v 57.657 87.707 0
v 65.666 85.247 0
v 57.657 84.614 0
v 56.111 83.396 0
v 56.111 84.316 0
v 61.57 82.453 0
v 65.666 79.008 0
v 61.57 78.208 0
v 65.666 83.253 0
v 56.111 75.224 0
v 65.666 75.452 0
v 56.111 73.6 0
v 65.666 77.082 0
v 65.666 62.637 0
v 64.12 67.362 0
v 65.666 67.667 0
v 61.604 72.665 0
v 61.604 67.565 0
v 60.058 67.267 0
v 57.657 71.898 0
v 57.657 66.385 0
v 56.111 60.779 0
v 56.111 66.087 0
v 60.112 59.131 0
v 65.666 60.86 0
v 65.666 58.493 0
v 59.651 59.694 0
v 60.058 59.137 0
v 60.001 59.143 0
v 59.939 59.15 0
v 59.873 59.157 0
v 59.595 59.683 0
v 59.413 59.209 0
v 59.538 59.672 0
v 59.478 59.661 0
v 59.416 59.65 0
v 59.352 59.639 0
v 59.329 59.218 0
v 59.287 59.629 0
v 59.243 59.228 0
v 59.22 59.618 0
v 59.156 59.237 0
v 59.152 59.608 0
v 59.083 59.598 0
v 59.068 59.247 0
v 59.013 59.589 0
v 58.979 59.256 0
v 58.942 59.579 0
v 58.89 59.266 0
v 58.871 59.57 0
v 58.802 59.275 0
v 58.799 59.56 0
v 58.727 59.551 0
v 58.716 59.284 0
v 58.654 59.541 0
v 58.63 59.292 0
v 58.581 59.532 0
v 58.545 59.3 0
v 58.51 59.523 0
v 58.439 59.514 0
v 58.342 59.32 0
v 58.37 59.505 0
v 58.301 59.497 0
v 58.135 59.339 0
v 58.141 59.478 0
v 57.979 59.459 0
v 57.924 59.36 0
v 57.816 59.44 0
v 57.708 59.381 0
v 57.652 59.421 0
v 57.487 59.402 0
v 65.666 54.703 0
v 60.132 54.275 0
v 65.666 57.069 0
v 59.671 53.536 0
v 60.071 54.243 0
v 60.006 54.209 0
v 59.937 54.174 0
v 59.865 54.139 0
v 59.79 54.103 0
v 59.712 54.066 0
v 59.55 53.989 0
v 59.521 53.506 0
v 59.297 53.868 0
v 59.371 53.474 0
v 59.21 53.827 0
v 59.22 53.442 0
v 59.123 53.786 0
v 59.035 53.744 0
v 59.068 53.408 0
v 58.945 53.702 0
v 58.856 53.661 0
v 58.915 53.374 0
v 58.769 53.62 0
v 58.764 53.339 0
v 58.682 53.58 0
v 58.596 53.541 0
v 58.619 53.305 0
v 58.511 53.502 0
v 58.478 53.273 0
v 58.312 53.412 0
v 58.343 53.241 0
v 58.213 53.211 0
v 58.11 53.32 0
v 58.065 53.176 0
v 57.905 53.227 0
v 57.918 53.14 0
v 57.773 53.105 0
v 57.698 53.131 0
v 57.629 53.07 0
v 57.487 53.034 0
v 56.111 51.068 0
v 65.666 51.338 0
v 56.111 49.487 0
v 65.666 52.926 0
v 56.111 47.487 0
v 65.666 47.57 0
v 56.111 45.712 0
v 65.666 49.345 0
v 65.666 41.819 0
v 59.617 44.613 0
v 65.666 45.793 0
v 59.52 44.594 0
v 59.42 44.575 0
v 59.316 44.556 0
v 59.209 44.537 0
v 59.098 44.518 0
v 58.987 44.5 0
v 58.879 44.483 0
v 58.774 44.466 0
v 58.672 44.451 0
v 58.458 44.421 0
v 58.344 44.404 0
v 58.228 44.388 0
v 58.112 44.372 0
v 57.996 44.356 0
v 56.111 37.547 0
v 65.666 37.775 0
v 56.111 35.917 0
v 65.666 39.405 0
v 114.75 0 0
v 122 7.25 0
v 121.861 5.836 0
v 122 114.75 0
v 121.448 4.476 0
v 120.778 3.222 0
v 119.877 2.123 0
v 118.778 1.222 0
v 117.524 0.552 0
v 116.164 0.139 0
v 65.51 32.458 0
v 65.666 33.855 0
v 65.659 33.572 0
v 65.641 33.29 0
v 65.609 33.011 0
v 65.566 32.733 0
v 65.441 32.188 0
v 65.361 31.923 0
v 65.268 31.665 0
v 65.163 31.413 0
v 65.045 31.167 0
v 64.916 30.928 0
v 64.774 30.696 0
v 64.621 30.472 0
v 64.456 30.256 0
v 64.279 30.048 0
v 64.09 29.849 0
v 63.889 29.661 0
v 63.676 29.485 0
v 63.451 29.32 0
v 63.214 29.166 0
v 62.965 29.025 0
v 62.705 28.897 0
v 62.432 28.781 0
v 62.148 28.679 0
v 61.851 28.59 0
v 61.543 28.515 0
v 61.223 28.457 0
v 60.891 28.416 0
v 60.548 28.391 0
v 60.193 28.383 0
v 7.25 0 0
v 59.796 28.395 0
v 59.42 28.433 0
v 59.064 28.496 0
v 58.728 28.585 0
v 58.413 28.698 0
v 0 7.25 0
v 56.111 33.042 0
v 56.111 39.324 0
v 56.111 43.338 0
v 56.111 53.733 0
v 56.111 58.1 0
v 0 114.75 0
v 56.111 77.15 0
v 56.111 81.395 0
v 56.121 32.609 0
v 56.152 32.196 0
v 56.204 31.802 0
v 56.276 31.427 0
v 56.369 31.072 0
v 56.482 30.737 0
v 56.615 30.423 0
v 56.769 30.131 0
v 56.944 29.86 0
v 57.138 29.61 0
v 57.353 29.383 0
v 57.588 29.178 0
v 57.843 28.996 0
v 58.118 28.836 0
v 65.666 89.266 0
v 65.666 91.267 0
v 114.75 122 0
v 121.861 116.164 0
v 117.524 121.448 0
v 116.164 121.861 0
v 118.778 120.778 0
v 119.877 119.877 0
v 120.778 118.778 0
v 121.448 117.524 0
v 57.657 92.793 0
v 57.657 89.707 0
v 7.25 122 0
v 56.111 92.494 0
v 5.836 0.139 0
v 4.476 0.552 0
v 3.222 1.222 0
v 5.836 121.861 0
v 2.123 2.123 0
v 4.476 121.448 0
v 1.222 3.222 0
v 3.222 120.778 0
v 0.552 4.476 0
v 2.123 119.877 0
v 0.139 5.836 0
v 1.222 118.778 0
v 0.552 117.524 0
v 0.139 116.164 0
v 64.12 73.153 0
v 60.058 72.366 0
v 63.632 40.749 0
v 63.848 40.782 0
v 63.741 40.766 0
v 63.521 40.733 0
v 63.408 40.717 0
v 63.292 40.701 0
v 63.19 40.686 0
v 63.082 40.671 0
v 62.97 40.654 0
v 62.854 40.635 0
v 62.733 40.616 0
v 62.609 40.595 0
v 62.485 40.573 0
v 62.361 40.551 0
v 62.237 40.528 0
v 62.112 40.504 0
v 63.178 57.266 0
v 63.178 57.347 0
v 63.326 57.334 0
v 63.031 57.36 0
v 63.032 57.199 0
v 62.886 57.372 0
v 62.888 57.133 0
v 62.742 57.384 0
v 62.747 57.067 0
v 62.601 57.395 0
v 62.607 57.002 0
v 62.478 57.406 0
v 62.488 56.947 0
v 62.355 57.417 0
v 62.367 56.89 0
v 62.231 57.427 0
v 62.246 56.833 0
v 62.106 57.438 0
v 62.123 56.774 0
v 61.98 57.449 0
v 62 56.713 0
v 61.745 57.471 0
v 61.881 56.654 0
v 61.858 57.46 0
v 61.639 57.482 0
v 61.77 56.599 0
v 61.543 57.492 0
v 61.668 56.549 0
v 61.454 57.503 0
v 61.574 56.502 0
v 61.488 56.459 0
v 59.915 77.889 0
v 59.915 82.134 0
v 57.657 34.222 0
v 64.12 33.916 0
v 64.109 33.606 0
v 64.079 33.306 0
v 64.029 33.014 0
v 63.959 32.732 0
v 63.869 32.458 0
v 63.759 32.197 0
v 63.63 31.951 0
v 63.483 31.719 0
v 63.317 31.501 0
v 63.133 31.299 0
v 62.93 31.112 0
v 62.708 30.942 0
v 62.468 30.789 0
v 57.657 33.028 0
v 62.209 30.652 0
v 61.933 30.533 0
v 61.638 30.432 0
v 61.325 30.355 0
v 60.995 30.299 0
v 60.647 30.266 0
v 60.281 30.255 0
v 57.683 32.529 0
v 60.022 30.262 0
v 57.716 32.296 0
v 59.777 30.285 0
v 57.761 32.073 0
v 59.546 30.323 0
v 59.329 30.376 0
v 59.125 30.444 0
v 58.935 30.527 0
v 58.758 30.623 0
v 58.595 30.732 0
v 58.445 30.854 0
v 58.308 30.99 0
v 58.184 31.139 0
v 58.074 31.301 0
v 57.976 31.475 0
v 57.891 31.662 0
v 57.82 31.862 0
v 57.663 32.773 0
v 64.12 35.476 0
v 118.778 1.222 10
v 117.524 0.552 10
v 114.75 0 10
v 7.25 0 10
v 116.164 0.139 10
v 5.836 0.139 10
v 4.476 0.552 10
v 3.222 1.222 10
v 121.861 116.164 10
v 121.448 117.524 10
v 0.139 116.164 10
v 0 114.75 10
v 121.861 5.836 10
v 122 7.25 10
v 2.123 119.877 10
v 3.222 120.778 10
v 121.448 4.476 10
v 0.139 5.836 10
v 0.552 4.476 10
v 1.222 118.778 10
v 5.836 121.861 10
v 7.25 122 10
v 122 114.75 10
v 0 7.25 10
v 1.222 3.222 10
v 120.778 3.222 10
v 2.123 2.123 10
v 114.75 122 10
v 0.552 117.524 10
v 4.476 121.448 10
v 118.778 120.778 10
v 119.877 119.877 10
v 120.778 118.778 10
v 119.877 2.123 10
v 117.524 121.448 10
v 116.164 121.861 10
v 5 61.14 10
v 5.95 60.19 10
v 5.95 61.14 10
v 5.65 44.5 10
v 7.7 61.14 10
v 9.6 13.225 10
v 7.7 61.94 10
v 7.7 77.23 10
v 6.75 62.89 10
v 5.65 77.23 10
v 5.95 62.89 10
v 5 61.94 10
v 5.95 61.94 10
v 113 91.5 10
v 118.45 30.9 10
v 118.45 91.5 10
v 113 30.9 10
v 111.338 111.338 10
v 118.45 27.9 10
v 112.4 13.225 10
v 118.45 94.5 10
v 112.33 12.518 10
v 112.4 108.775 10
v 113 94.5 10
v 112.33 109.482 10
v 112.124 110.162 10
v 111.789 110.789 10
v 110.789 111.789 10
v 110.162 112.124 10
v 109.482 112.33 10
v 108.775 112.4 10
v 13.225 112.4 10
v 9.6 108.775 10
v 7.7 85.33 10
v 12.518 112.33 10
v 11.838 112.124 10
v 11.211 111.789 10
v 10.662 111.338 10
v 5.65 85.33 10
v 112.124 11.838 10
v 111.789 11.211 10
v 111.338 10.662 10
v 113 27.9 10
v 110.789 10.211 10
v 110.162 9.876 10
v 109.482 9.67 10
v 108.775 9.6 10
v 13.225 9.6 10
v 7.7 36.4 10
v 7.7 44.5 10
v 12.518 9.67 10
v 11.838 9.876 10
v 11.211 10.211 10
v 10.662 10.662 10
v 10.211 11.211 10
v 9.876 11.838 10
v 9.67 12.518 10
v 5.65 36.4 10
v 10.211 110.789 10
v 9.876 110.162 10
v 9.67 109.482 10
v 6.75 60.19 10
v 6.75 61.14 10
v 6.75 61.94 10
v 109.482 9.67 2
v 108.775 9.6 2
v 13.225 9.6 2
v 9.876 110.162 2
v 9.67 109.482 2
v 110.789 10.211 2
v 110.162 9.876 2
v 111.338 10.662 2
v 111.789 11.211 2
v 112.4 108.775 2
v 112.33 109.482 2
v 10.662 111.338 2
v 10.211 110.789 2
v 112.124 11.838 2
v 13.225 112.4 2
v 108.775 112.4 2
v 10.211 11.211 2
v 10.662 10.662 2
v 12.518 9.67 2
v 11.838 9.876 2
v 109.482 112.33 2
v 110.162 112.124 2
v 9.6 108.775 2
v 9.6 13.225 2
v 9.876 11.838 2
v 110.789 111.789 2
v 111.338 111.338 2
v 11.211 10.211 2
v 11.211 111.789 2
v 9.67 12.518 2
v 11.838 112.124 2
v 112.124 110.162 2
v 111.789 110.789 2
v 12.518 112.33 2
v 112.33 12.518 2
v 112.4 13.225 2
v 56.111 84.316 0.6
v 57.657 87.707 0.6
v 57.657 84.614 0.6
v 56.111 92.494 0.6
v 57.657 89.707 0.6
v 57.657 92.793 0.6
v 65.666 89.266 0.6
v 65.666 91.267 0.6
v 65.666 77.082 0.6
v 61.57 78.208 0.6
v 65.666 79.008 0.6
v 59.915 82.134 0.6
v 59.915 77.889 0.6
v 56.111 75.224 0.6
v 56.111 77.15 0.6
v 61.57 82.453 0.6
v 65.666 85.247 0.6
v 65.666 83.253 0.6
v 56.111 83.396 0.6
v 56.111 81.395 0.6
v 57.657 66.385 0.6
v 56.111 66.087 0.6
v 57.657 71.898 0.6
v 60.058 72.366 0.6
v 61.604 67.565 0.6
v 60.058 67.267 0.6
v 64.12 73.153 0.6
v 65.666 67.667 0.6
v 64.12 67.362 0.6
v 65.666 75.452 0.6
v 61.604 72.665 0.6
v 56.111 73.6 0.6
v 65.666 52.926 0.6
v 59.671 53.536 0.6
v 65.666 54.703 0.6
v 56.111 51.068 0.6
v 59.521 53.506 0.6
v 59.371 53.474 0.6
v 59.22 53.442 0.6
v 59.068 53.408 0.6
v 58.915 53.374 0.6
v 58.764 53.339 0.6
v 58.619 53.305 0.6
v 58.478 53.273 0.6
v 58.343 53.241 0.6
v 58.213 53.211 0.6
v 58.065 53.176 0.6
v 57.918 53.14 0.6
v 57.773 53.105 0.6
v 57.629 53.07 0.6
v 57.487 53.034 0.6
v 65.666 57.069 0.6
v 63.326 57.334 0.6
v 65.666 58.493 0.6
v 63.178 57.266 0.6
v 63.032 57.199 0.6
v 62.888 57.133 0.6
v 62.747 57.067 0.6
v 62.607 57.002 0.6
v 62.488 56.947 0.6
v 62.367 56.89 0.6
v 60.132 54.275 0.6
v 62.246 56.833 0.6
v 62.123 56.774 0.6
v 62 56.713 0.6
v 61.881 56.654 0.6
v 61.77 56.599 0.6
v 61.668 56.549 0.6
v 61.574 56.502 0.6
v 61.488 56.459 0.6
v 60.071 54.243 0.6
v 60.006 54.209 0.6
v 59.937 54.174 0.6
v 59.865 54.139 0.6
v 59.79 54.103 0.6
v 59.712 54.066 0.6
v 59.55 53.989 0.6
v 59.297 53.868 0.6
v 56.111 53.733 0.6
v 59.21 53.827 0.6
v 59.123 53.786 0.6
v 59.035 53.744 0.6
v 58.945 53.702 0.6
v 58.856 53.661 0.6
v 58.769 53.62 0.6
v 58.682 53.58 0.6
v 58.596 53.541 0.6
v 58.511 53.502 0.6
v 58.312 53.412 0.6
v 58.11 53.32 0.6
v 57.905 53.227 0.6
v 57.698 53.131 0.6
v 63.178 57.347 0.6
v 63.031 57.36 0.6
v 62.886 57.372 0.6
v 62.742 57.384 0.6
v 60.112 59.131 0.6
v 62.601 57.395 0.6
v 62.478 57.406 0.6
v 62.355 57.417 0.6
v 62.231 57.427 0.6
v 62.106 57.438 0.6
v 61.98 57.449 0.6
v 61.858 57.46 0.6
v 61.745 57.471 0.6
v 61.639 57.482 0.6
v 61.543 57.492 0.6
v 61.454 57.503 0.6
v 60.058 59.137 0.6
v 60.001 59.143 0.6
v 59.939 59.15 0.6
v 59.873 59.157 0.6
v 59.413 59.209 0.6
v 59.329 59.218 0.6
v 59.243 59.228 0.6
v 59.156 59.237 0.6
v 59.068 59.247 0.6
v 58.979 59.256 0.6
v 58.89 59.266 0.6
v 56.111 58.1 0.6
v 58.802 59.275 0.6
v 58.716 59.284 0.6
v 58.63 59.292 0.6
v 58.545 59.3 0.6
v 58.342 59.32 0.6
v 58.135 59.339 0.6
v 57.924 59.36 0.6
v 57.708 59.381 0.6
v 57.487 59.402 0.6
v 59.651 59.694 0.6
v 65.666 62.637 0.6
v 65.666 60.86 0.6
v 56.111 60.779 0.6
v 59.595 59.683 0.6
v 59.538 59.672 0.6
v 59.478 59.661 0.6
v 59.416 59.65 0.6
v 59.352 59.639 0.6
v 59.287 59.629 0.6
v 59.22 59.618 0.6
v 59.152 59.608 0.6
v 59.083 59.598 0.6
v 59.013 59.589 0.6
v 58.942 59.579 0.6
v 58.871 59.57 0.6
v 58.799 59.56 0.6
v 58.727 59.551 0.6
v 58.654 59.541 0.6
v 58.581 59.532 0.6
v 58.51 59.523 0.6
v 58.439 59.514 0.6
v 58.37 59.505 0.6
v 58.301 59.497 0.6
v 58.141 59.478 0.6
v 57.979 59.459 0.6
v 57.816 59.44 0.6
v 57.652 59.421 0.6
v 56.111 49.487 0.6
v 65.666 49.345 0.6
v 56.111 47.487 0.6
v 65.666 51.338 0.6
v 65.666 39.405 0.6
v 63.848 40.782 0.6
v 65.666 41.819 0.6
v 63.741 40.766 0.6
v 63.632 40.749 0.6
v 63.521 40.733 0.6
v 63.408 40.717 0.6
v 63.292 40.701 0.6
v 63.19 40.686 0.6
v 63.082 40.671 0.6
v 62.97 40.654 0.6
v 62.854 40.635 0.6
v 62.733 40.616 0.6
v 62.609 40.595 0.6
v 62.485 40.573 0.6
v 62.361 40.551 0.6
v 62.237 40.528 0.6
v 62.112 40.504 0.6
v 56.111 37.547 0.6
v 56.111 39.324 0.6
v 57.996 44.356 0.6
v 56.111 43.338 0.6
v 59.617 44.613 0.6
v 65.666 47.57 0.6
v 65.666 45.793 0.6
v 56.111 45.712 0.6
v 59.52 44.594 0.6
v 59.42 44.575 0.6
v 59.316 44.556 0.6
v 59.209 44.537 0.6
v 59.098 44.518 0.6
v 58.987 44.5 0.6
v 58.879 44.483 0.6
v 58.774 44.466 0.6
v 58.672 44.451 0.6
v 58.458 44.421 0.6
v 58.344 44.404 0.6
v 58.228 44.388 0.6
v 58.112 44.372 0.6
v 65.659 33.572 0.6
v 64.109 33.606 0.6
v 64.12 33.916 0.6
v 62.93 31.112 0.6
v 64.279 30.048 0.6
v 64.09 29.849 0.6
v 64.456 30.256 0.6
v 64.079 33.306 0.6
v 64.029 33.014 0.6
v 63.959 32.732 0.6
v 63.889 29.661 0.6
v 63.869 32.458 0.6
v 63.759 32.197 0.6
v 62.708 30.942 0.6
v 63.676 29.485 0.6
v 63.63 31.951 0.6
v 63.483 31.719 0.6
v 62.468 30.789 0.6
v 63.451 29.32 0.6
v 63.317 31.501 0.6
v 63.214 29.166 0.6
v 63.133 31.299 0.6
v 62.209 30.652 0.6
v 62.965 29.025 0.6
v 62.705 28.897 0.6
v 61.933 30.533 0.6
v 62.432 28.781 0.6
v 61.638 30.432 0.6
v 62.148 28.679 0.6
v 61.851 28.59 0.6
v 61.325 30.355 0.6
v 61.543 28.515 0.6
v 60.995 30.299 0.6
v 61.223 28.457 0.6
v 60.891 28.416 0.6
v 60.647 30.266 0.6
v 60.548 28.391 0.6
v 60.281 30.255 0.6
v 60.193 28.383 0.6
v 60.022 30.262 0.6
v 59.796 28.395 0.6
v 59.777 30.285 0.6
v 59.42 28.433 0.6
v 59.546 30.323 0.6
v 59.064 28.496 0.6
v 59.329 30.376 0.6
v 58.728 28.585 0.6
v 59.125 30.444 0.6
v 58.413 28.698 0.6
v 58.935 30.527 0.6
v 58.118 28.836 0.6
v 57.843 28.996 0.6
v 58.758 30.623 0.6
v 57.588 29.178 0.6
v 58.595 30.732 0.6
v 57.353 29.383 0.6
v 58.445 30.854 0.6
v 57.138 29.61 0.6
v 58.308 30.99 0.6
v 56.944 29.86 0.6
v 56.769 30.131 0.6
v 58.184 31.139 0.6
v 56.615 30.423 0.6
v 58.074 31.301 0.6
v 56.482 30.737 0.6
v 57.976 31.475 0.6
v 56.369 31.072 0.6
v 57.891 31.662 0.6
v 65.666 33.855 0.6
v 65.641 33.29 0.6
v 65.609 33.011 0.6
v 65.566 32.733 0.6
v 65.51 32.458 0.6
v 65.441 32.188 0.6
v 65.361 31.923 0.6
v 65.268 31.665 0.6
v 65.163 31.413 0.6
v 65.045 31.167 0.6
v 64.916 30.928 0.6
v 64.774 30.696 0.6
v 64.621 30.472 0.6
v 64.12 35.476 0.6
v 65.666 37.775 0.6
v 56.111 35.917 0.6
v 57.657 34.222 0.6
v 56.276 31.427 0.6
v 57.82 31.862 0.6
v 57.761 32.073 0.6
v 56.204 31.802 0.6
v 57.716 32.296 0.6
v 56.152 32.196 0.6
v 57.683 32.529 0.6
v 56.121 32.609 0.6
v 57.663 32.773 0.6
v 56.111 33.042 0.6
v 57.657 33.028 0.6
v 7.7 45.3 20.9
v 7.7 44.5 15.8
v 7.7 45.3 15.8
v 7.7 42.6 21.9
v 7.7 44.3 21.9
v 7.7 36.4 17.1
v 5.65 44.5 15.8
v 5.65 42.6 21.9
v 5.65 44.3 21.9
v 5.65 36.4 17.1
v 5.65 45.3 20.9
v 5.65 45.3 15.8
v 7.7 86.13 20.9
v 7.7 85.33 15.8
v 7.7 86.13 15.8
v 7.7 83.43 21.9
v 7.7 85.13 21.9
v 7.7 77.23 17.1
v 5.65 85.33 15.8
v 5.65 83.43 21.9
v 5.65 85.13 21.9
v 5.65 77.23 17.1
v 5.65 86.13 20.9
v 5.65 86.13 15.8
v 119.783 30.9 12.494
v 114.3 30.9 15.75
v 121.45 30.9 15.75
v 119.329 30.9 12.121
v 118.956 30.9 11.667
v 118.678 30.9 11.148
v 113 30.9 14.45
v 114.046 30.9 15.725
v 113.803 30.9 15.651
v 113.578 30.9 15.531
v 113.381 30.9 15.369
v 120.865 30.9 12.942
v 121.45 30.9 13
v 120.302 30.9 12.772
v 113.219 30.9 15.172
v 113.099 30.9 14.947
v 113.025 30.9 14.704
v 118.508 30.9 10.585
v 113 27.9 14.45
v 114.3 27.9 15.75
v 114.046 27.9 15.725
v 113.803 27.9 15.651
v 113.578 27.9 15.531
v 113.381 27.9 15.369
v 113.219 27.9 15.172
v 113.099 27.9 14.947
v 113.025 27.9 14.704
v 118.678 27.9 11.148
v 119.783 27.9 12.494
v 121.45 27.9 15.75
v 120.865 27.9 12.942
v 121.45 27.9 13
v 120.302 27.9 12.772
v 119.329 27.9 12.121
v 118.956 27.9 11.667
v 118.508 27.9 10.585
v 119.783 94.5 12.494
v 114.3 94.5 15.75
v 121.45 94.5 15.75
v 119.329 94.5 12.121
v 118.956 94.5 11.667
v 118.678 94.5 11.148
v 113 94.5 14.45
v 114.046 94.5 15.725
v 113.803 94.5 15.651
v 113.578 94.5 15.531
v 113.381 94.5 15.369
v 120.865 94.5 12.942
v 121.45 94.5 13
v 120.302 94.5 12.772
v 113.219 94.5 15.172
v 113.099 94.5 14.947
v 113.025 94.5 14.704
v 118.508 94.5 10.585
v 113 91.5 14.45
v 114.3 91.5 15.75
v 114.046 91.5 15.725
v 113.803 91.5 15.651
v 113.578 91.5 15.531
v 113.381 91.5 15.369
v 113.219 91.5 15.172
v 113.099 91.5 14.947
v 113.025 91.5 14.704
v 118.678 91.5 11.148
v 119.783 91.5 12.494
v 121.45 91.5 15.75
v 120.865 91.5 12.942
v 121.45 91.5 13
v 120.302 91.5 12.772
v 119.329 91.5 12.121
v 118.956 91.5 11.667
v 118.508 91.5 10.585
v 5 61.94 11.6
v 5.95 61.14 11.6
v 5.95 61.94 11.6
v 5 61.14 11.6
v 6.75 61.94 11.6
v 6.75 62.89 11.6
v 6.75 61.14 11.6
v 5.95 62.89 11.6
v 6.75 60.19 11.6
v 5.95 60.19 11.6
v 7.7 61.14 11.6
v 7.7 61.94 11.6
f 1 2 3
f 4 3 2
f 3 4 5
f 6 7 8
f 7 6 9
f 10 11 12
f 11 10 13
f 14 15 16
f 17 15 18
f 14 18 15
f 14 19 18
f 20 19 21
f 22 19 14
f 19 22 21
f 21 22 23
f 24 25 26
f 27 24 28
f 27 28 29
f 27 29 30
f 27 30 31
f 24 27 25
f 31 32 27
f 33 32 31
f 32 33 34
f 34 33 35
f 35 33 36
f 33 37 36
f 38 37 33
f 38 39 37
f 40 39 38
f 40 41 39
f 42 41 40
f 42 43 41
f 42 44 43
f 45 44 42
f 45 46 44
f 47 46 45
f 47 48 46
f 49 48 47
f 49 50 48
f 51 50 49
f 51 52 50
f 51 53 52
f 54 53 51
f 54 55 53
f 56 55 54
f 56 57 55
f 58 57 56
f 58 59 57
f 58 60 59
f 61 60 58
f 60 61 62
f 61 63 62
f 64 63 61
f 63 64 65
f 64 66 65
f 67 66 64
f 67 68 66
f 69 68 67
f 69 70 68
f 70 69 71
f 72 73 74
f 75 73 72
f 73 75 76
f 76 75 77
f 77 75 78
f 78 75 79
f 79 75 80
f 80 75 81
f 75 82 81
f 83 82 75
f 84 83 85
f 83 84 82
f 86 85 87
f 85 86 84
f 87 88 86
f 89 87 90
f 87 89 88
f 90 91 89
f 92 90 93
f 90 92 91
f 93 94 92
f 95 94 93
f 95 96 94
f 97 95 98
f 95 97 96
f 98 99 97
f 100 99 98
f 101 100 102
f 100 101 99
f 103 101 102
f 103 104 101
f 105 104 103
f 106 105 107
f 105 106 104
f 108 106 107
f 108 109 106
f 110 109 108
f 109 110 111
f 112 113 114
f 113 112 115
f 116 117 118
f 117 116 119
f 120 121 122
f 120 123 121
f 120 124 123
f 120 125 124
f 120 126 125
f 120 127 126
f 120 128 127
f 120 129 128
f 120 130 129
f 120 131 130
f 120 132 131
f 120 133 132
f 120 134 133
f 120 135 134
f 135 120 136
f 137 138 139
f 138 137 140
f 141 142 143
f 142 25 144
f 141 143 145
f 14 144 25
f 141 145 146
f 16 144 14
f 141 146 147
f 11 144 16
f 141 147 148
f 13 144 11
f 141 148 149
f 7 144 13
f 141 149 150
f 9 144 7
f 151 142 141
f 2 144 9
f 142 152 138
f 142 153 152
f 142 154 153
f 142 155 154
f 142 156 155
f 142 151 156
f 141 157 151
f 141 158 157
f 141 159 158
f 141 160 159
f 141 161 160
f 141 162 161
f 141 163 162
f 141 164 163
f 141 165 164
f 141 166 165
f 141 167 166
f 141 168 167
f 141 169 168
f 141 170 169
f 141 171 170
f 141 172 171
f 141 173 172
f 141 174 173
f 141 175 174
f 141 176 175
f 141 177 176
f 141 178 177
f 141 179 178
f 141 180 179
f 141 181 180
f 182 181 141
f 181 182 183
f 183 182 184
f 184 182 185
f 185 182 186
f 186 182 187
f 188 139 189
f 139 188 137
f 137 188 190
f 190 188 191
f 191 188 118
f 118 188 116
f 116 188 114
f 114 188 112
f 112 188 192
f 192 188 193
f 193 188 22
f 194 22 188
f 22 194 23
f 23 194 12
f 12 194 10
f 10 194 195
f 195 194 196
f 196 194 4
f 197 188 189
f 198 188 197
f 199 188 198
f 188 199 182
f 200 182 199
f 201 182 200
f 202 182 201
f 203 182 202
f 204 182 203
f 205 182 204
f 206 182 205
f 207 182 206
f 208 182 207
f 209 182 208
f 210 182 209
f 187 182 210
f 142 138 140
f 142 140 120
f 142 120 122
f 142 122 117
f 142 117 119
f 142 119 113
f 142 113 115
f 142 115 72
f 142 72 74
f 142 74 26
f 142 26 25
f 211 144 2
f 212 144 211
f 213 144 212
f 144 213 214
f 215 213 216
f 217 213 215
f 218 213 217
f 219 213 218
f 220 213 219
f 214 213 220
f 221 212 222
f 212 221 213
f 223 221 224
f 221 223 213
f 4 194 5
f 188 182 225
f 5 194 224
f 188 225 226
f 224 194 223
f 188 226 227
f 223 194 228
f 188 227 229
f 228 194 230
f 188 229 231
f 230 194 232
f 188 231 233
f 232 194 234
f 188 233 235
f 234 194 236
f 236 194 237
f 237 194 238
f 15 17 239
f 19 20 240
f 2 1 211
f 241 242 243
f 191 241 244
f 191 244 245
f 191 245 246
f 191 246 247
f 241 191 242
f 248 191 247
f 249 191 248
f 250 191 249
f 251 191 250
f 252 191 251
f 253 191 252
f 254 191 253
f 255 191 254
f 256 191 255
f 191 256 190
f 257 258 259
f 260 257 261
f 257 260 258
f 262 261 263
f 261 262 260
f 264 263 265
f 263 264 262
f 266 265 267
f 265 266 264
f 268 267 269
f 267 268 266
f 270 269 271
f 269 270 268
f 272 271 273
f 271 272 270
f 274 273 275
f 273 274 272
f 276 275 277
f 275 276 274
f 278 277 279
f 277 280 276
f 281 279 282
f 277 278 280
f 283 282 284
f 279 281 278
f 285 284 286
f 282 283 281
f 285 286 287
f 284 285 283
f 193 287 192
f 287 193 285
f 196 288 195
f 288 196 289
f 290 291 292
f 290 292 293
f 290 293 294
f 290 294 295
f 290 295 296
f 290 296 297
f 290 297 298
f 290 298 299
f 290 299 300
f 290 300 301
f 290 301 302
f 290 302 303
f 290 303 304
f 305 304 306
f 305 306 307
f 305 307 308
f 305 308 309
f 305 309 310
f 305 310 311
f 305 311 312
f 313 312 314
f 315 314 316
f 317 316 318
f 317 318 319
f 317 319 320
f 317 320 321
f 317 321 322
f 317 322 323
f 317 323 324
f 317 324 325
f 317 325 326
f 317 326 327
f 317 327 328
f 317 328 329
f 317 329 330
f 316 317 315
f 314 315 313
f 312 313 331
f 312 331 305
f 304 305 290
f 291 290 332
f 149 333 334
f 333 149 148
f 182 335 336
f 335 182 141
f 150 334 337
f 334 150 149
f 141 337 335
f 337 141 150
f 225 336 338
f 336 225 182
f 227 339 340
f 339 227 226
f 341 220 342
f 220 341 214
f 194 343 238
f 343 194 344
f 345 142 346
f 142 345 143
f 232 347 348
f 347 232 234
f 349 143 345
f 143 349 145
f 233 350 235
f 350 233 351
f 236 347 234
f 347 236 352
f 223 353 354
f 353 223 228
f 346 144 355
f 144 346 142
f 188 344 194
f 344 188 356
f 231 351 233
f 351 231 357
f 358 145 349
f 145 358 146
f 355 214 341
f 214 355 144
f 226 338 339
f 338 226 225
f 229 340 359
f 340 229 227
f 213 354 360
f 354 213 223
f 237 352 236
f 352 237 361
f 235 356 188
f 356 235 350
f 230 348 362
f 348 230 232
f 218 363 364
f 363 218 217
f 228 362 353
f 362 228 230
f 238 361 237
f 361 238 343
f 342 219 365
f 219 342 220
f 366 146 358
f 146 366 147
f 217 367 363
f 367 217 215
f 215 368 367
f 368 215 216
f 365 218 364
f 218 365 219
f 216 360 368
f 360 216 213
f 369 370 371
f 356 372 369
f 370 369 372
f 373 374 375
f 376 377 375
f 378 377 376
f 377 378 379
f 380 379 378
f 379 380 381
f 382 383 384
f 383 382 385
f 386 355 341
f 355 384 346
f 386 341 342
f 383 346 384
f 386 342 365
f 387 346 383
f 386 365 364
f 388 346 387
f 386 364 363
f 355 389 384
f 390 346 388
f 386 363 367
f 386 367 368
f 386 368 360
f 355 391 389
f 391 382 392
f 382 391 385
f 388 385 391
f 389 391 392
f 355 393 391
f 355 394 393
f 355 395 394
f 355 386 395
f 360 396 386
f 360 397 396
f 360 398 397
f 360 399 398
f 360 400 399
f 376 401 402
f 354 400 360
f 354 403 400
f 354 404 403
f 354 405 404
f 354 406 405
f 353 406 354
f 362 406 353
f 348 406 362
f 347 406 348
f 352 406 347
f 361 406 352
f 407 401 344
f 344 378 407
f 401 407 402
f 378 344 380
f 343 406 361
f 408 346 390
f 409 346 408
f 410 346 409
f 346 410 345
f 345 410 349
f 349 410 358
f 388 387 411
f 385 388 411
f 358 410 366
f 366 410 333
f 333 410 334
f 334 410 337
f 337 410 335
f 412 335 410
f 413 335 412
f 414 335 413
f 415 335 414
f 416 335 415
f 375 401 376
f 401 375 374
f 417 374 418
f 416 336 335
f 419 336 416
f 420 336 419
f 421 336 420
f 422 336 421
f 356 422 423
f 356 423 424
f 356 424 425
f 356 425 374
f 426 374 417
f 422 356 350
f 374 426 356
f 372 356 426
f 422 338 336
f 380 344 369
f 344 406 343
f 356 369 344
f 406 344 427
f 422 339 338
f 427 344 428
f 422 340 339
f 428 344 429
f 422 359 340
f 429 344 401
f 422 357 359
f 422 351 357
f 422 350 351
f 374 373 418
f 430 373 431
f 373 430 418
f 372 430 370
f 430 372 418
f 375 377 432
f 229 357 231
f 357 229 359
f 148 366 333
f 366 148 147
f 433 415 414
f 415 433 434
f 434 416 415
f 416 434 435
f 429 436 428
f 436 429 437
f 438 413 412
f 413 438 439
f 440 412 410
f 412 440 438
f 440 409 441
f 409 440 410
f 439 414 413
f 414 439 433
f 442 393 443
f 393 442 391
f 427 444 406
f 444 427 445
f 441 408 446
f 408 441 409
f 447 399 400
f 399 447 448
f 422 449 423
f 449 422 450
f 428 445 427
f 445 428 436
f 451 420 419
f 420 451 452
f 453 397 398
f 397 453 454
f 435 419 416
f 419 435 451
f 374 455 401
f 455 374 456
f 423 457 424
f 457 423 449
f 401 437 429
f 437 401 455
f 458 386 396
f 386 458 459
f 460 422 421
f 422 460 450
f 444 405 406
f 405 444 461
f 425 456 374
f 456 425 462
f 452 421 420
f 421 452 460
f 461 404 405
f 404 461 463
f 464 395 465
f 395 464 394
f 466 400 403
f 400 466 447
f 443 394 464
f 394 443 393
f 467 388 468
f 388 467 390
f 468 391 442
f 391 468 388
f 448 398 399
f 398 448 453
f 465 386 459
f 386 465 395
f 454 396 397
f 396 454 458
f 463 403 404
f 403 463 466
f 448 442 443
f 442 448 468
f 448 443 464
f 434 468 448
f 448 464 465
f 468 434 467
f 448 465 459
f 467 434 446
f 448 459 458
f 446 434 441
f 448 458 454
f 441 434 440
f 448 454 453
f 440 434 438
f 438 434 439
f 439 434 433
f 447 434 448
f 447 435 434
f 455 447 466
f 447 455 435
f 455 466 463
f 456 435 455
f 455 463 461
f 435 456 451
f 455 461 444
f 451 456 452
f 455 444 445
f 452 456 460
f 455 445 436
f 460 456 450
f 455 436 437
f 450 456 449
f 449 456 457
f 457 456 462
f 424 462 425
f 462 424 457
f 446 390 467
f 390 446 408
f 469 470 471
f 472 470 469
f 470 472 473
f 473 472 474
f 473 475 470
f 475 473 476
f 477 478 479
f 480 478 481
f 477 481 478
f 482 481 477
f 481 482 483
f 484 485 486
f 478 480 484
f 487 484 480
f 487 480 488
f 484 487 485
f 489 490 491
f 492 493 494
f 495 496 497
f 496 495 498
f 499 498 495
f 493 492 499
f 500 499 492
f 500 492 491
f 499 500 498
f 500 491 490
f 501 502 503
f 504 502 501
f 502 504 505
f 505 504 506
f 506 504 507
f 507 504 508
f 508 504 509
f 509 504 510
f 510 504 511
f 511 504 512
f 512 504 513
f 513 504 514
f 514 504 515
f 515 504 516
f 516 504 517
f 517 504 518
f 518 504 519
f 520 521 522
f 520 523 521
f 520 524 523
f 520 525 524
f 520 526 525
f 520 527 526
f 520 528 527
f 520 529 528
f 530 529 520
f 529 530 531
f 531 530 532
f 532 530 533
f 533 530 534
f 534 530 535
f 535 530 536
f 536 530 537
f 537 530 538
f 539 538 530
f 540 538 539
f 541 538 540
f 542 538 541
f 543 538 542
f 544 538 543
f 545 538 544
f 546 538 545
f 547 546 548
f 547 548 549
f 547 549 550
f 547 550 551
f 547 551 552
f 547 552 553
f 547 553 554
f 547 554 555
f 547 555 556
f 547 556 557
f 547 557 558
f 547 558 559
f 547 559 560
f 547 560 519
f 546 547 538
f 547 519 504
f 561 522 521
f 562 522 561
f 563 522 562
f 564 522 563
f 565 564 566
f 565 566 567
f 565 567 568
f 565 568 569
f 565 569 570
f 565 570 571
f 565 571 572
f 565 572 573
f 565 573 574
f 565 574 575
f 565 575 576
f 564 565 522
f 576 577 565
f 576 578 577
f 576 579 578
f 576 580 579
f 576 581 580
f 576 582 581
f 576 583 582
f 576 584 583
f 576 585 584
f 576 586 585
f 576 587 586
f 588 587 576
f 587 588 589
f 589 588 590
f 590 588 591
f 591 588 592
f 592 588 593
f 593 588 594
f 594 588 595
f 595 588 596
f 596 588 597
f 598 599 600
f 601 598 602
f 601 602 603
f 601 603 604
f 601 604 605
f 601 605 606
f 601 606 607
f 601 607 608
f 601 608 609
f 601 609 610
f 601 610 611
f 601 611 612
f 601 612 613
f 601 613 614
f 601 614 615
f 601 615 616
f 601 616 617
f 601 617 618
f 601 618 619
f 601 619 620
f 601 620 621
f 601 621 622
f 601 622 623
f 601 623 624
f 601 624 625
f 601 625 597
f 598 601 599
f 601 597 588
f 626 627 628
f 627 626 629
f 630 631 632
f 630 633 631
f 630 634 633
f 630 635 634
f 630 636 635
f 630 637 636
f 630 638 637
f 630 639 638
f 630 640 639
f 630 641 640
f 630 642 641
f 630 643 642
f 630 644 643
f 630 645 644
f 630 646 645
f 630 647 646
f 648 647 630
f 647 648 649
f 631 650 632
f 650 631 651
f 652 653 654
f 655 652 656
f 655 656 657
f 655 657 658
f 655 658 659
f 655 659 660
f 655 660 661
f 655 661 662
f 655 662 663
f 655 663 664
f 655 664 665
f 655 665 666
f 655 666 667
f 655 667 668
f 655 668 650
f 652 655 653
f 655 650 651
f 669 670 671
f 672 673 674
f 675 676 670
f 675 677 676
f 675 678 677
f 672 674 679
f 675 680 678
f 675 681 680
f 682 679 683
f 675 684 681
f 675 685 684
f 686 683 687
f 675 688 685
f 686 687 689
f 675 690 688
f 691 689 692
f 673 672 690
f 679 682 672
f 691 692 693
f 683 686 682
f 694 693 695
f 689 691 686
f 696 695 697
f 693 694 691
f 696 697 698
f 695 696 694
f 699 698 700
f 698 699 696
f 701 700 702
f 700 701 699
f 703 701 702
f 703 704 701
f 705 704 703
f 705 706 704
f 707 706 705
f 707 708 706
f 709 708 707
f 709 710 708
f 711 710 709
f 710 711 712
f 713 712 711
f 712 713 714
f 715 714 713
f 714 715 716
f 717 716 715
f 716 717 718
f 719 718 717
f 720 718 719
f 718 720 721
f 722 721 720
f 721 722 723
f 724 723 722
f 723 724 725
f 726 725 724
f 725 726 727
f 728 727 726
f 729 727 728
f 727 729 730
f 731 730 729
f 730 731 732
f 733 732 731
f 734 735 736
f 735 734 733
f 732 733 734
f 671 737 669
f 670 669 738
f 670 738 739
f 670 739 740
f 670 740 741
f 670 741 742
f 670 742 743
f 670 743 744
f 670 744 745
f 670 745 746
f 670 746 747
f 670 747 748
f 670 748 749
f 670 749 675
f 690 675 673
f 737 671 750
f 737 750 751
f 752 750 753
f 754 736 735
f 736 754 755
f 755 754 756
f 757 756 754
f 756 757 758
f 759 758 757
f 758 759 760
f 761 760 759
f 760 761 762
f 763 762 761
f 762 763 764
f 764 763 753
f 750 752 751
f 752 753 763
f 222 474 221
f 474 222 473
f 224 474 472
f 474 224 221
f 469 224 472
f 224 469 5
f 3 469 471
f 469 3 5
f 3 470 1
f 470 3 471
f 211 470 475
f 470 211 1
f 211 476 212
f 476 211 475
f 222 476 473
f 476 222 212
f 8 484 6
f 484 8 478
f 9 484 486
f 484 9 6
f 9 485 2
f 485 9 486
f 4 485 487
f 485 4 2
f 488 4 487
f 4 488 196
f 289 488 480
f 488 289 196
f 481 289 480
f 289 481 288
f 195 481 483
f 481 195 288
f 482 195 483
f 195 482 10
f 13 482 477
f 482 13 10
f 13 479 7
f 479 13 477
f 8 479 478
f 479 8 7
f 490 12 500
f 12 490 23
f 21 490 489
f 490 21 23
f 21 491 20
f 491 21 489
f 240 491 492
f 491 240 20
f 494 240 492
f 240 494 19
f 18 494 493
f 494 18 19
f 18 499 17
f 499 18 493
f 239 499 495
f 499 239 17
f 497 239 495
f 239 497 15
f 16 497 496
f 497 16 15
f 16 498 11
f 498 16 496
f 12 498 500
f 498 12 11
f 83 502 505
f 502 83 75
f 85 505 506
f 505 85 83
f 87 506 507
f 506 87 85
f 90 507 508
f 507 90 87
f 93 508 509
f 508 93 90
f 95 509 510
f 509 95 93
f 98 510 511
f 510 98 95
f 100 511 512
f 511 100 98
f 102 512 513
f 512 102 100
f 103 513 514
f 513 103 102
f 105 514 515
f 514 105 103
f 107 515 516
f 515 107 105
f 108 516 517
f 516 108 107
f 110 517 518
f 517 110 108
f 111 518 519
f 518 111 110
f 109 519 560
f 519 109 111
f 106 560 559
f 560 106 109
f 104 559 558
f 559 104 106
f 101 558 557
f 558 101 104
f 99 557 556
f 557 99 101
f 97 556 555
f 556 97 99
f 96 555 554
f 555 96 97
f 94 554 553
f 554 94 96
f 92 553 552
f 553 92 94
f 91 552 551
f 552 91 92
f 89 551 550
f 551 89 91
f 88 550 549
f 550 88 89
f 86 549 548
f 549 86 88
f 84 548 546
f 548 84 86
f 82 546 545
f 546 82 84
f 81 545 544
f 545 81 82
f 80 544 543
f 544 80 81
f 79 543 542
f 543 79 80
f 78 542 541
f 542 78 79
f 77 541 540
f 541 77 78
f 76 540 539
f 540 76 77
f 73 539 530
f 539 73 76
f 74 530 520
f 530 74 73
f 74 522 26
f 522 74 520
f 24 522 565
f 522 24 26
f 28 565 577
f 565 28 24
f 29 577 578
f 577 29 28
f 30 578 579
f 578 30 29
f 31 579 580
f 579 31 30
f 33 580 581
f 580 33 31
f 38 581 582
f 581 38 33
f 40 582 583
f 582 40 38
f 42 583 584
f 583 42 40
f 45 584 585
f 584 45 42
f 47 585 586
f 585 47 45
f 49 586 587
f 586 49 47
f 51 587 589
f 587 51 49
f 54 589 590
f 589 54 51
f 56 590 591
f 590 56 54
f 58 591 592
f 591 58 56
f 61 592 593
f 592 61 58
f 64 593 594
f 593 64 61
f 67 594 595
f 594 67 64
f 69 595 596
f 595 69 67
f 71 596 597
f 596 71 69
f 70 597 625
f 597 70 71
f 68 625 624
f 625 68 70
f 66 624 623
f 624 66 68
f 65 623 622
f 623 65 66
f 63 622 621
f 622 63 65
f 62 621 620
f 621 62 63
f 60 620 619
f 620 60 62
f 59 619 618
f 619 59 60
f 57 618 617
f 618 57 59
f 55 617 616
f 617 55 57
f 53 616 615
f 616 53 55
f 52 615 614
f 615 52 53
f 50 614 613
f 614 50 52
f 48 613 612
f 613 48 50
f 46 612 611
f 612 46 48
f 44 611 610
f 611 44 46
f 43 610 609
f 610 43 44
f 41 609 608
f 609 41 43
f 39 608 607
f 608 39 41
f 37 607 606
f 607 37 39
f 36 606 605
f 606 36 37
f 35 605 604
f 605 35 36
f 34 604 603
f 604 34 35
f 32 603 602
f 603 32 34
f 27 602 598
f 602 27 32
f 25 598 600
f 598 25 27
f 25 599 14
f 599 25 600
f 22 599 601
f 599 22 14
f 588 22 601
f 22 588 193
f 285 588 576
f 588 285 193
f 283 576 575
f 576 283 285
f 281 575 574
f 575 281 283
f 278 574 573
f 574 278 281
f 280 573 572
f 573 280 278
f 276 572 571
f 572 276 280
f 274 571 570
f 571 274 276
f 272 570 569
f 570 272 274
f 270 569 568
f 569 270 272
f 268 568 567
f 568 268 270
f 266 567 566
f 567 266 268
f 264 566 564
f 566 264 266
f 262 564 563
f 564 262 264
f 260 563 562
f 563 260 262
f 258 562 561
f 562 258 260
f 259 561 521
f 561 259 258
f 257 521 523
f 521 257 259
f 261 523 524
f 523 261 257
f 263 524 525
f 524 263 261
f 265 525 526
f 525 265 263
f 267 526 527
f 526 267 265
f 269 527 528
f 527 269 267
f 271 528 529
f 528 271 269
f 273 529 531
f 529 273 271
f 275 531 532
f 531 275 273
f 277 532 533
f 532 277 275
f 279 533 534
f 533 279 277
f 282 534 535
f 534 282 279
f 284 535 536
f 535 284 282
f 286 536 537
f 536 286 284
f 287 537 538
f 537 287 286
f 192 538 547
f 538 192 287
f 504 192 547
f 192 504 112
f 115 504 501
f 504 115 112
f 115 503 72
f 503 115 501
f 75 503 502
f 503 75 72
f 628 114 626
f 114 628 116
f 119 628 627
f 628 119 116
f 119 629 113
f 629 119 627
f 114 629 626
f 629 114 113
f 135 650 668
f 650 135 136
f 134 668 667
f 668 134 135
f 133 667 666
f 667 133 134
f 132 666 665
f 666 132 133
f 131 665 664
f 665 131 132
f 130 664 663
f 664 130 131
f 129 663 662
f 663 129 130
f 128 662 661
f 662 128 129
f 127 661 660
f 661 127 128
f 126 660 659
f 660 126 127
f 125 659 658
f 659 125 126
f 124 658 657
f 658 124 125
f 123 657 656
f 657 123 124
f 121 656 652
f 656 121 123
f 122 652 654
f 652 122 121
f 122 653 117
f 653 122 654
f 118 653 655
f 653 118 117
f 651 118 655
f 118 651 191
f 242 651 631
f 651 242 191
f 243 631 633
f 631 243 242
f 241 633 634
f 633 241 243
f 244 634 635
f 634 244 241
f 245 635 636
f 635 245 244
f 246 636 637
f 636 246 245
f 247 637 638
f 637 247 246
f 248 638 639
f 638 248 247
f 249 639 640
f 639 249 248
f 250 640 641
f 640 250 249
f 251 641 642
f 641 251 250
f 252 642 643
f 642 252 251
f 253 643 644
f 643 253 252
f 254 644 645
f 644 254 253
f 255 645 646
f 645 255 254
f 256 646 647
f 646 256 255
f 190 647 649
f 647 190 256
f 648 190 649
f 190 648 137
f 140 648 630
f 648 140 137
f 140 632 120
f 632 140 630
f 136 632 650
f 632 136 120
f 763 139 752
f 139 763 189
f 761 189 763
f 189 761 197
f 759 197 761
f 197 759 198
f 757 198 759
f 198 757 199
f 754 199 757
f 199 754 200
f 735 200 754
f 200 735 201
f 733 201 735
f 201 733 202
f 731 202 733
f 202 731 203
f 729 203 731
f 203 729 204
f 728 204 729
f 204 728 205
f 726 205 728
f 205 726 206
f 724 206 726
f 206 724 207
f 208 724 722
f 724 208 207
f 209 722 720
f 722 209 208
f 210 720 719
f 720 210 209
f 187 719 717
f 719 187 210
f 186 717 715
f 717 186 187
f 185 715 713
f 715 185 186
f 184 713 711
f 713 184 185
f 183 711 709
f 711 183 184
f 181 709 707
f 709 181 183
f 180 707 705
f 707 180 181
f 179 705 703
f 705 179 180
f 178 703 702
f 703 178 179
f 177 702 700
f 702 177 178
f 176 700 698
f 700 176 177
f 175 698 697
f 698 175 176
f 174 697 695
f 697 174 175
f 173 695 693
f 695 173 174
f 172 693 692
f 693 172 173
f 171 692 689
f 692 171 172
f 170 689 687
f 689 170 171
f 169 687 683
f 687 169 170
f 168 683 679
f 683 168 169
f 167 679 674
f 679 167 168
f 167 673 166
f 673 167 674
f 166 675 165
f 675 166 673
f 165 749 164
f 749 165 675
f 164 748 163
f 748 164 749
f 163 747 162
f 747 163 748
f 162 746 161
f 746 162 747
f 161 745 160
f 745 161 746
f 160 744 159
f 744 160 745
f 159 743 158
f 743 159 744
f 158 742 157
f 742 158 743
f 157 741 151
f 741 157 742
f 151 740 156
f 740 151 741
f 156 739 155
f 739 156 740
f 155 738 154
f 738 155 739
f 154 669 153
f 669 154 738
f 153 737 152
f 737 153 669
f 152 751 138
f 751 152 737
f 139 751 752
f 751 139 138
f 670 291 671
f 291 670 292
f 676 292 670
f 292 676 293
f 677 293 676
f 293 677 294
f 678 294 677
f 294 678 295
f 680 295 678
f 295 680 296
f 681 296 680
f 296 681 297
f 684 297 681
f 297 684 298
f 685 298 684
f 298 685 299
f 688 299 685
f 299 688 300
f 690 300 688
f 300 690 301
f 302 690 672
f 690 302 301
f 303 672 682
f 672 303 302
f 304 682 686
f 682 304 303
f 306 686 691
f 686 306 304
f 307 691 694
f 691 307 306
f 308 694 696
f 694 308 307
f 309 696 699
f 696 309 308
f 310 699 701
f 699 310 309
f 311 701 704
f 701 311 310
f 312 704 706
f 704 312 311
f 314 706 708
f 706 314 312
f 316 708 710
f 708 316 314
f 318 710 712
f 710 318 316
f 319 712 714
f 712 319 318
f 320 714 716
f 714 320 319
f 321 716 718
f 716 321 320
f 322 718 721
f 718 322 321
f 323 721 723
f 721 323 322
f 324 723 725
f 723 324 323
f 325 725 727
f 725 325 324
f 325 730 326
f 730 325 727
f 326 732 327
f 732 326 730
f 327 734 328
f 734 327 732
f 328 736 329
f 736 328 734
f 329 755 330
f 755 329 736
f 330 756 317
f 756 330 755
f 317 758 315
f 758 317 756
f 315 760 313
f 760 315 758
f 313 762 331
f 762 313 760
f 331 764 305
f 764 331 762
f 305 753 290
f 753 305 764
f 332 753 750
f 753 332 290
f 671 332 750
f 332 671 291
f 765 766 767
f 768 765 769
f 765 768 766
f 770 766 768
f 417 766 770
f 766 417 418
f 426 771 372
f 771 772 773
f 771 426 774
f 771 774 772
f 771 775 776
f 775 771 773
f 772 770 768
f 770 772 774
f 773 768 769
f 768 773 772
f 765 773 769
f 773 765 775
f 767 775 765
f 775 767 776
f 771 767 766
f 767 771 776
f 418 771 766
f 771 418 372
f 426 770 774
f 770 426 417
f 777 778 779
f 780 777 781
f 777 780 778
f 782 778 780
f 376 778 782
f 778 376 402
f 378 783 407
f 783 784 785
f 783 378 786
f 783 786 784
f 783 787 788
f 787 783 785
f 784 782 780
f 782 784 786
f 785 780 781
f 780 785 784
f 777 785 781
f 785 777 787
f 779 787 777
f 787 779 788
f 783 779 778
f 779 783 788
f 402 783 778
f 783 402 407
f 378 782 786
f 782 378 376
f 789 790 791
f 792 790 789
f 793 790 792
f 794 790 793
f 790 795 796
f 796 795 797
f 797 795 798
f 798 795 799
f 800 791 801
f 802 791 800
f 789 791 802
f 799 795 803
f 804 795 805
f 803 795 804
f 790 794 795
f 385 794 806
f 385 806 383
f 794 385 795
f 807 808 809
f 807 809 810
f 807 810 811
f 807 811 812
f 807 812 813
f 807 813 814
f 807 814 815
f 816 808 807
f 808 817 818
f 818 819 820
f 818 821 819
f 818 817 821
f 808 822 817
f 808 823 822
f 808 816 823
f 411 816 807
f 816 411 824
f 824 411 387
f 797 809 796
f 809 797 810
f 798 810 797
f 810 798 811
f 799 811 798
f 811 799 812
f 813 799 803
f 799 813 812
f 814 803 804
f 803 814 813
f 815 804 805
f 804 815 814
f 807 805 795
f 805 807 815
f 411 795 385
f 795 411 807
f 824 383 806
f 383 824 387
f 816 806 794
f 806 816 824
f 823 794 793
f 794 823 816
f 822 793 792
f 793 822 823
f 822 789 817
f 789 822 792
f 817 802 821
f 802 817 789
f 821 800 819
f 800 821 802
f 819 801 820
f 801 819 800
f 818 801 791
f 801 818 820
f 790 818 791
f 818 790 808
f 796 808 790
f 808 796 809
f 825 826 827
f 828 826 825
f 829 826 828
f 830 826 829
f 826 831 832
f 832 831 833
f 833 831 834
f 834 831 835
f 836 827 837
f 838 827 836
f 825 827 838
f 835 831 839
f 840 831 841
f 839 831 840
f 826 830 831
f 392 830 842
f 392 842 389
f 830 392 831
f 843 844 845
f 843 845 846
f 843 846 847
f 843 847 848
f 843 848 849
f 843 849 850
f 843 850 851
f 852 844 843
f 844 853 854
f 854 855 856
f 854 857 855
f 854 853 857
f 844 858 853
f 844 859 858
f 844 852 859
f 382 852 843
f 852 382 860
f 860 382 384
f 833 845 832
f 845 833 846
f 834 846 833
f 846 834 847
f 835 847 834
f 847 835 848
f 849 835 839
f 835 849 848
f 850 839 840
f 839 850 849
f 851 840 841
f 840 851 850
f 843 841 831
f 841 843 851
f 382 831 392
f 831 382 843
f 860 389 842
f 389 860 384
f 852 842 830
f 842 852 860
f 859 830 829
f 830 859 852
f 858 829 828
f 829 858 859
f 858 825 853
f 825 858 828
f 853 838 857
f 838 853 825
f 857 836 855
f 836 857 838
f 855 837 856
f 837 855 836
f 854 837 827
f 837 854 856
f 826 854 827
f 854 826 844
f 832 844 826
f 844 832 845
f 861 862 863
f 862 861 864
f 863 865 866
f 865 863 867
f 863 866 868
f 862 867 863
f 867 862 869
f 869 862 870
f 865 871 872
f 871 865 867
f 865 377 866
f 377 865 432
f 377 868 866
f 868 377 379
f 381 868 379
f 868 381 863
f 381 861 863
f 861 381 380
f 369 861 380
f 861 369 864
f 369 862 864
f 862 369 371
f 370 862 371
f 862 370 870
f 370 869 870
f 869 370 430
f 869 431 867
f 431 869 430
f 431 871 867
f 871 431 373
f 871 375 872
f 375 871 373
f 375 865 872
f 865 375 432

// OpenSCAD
// Mini PC Extended Lid (to fit fat 4TB HDD)

$fn = 32;

lid_len = 122.0;
lid_h = 2.0;
lid_rounding = 7.25;
// My additions (set to zero for default lid)
lid_depth = 8.0;
lid_wall_thick = 9.6;
cutout_rounding = lid_rounding/2;

latch_thick = 2.05;
latch_base_len = 8.1;
latch_base_h = 5.8;
latch_tip_h = 6.1;
latch_tip_len = 8.9;
latch_tip_up = 1.3;
tip_canter = 1.0;
tip_flat_len = 1.7;

hook_thick = 3.0;
hook_h = 5.75;
hook_len = 8.45;
hook_tip_h = 2.1;
hook_base_len = 5.45;
hook_back_rounding = 1.3;

lower_latch_orig_y = 44.5;
lower_latch_orig_x = 7.7;
upper_latch_orig_y = 40.83 + lower_latch_orig_y;
upper_latch_orig_x = lower_latch_orig_x;

lower_hook_orig_x = lid_len - 9.0;
lower_hook_orig_y = 30.9;
upper_hook_orig_x = lower_hook_orig_x;
upper_hook_orig_y = 94.5;

plus_arm_thick = 0.8;
plus_len = 2.7;
plus_orig_x = lower_latch_orig_x;
plus_orig_y = ((upper_latch_orig_y-latch_base_len/2)+lower_latch_orig_y)/2;
plus_h = 1.6;

front_text_string = "THE MIND";
front_text_size = 10.0;
front_text_font = "Liberation Sans:style=Bold Italic";
front_text_thick = 0.6;

module latch() {
    rotate([90,0,-90])
    linear_extrude(latch_thick)
    polygon([
        [0, 0],
        [0, latch_base_h],
        [latch_base_len-latch_tip_len, latch_base_h],
        [latch_base_len-latch_tip_len, latch_base_h+latch_tip_h-tip_canter],
        [latch_base_len-latch_tip_len+tip_canter, latch_base_h+latch_tip_h],
        [latch_base_len-latch_tip_len+tip_canter+tip_flat_len, latch_base_h+latch_tip_h],
        [latch_base_len, latch_base_h+latch_tip_up],
        [latch_base_len, 0]
    ]);
}

//latch();

module hook() {
    rotate([90,0,0])
    linear_extrude(hook_thick) {
    offset(hook_back_rounding) offset(-hook_back_rounding)
    square([hook_base_len, hook_h]);
    difference() {
        square([hook_base_len, hook_h]);
        translate([-hook_base_len/2, hook_h/2])
        square([hook_base_len, hook_h]);
    }
    translate([hook_base_len, 0]) {
        difference() {
            square([hook_len-hook_base_len, hook_h]);
            translate([hook_len-hook_base_len, 0])
            circle(r=hook_len-hook_base_len);
        }
    }
    }
}

//hook();

module plus() {
    corner_len = (plus_len-plus_arm_thick)/2;
    linear_extrude(plus_h)
    translate([-plus_len, -plus_len])
    difference() {
        square(plus_len);
        square(corner_len);
        translate([corner_len+plus_arm_thick, 0])
        square(corner_len);
        translate([corner_len+plus_arm_thick, corner_len+plus_arm_thick])
        square(corner_len);
        translate([0, corner_len+plus_arm_thick])
        square(corner_len);
    }
}

//plus();

module front_text() {
    linear_extrude(front_text_thick)
    translate([lid_len/2, lid_len/2])
    rotate([0,0,90])
    scale([-1,1,1])
    text(front_text_string, size=front_text_size, font=front_text_font, halign="center", valign="center");
}

//front_text();

module bare_lid() {
    difference() {
        linear_extrude(lid_depth+lid_h)
        offset(lid_rounding) offset(-lid_rounding)
        square(lid_len);
        translate([lid_wall_thick,lid_wall_thick,lid_h])
        linear_extrude(lid_depth)
        offset(cutout_rounding) offset(-cutout_rounding)
        square(lid_len-2*lid_wall_thick);
        front_text();
    }
}

module lid() {
    bare_lid();
    translate([0,0,lid_h+lid_depth]) {
        translate([lower_latch_orig_x,lower_latch_orig_y,0])
        latch();
        translate([upper_latch_orig_x,upper_latch_orig_y,0])
        latch();
        translate([lower_hook_orig_x,lower_hook_orig_y,0])
        hook();
        translate([upper_hook_orig_x,upper_hook_orig_y,0])
        hook();
        translate([plus_orig_x,plus_orig_y,0])
        plus();
    }
}

lid();
